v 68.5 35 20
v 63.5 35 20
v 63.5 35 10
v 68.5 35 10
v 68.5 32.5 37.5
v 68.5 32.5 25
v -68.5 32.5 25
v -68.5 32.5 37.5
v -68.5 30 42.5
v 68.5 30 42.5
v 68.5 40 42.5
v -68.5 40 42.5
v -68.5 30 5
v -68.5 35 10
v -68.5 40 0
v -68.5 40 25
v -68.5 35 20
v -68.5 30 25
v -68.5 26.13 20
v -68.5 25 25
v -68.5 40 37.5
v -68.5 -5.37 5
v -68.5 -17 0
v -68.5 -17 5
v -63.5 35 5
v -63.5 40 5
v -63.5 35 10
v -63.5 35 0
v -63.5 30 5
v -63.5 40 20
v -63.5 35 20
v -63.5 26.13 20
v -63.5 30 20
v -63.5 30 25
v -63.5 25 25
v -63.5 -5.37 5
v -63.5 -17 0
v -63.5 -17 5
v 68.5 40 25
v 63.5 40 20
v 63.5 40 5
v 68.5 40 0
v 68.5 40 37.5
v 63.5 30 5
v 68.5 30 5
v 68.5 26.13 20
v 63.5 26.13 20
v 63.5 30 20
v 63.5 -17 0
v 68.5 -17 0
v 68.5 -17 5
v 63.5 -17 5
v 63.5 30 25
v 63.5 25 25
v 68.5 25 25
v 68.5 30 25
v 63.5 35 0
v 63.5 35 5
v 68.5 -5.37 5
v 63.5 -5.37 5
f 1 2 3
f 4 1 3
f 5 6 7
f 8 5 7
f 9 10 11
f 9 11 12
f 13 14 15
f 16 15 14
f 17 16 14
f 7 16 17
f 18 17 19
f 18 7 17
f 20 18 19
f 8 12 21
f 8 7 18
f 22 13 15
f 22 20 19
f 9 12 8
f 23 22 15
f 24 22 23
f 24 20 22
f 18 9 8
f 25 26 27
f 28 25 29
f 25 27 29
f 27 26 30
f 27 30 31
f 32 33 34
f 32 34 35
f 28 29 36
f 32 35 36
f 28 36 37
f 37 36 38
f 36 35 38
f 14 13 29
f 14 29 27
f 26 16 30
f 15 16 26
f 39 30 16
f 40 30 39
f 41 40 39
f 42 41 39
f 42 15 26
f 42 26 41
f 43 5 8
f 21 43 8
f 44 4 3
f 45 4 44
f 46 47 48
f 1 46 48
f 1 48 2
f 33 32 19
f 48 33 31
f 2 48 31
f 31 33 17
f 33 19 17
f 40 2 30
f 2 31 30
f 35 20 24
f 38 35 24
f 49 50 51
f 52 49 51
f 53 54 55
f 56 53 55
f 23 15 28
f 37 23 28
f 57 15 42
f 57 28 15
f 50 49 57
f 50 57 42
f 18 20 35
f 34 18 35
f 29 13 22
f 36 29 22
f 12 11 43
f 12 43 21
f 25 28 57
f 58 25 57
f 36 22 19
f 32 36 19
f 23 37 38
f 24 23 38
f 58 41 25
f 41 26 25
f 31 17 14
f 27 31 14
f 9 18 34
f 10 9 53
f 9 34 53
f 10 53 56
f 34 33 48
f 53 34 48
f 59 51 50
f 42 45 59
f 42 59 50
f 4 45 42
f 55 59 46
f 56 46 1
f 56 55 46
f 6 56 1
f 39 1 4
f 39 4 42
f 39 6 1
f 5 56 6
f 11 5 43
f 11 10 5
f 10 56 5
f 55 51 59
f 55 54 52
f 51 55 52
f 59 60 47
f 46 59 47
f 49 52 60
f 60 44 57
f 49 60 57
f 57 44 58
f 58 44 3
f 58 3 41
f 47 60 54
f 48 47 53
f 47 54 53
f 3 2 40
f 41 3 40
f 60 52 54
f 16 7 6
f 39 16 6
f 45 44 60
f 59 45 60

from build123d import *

# Parameters (mm, degrees)
F0_W      = 137
F0_H      = 60
F0_W_2    = 127
F0_H_2    = 50
F1_DEPTH  = 25
F3_DEPTH  = 137.001
F4_DEPTH  = 10
F6_DEPTH  = 17.5
F7_W      = 137
F7_H      = 5
F8_DEPTH  = 7.5
F11_DEPTH = 137.001
F12_DEPTH = 5
F14_DEPTH = 137.001
F9_W      = 127
F9_H      = 15
F15_DEPTH = 57.001
F17_DEPTH = 137.001
F18_DEPTH = 5
F20_DEPTH = 5
F22_DEPTH = 5


with BuildPart() as f1:
    # F0 (on Top) → F1 (new body)
    with BuildSketch(Plane.XY):
        Rectangle(F0_W, F0_H)
        Rectangle(F0_W_2, F0_H_2, mode=Mode.SUBTRACT)
    extrude(amount=F1_DEPTH)

    # F2 (on face) → F3 (cut, through all)
    with BuildSketch(Plane(origin=(-68.5, 0, 0), x_dir=(0, -1, 0), z_dir=(-1, 0, 0))):
        Polygon((30, 25), (-25, 25), (30, 5), align=None)
    extrude(amount=-F3_DEPTH, mode=Mode.SUBTRACT)

    # F4 (add): a face of the model
    f4_faces = [f1.faces().sort_by_distance(p)[0] for p in [
        (0, 30, 12.5),
    ]]
    extrude(f4_faces, amount=F4_DEPTH)

    # F5 (on face) → F6 (join)
    with BuildSketch(Plane.XY.offset(25)):
        Polygon((68.5, 32.5), (-68.5, 32.5), (-68.5, 25), (-63.5, 25), (63.5, 25), (68.5, 25), align=None)
    extrude(amount=F6_DEPTH)

    # F7 (on face) → F8 (join, through all)
    with BuildSketch(Plane(origin=(0, 32.5, 0), x_dir=(-1, 0, 0), z_dir=(0, 1, 0))):
        with Locations((0, 40)):
            Rectangle(F7_W, F7_H)
    extrude(amount=F8_DEPTH)

    # F10 (on face) → F11 (cut, through all)
    with BuildSketch(Plane.YZ.offset(68.5)):
        Polygon((-30, 0), (-17, 0), (-17, 9.7272727273), (-30, 5), align=None)
    extrude(amount=-F11_DEPTH, mode=Mode.SUBTRACT)

    # F12 (cut): a face of the model
    f12_faces = [f1.faces().sort_by_distance(p)[0] for p in [
        (0, 25, 21.6425527142),
    ]]
    extrude(f12_faces, amount=-F12_DEPTH, mode=Mode.SUBTRACT)

    # F13 (on face) → F14 (cut, through all)
    with BuildSketch(Plane(origin=(-68.5, 0, 0), x_dir=(0, -1, 0), z_dir=(-1, 0, 0))):
        Polygon((-25, 25), (17, 5), (17, 9.7272727273), align=None)
    extrude(amount=-F14_DEPTH, mode=Mode.SUBTRACT)

    # F9 (on face) → F15 (cut, through all)
    with BuildSketch(Plane(origin=(0, 40, 0), x_dir=(-1, 0, 0), z_dir=(0, 1, 0))):
        with Locations((0, 12.5)):
            Rectangle(F9_W, F9_H)
    extrude(amount=-F15_DEPTH, mode=Mode.SUBTRACT)

    # F16 (on face) → F17 (cut, through all)
    with BuildSketch(Plane(origin=(-68.5, 0, 0), x_dir=(0, -1, 0), z_dir=(-1, 0, 0))):
        Polygon((5.3702966504, 5), (-9.2771325107, 11.9749662672), (-26.1297033496, 20), (-35, 20), (-35, 5), align=None)
    extrude(amount=-F17_DEPTH, mode=Mode.SUBTRACT)

    # F18 (cut, through all): a face of the model
    f18_faces = [f1.faces().sort_by_distance(p)[0] for p in [
        (0, 30, 2.5),
    ]]
    extrude(f18_faces, amount=-F18_DEPTH, mode=Mode.SUBTRACT)

    # F19 (on face) → F20 (join)
    with BuildSketch(Plane(origin=(-68.5, 0, 0), x_dir=(0, -1, 0), z_dir=(-1, 0, 0))):
        Polygon((-35, 5), (-30, 5), (-35, 10), align=None)
    extrude(amount=-F20_DEPTH)

    # F21 (on face) → F22 (join)
    with BuildSketch(Plane.YZ.offset(68.5)):
        Polygon((35, 10), (30, 5), (35, 5), align=None)
    extrude(amount=-F22_DEPTH)


solid = f1.part
